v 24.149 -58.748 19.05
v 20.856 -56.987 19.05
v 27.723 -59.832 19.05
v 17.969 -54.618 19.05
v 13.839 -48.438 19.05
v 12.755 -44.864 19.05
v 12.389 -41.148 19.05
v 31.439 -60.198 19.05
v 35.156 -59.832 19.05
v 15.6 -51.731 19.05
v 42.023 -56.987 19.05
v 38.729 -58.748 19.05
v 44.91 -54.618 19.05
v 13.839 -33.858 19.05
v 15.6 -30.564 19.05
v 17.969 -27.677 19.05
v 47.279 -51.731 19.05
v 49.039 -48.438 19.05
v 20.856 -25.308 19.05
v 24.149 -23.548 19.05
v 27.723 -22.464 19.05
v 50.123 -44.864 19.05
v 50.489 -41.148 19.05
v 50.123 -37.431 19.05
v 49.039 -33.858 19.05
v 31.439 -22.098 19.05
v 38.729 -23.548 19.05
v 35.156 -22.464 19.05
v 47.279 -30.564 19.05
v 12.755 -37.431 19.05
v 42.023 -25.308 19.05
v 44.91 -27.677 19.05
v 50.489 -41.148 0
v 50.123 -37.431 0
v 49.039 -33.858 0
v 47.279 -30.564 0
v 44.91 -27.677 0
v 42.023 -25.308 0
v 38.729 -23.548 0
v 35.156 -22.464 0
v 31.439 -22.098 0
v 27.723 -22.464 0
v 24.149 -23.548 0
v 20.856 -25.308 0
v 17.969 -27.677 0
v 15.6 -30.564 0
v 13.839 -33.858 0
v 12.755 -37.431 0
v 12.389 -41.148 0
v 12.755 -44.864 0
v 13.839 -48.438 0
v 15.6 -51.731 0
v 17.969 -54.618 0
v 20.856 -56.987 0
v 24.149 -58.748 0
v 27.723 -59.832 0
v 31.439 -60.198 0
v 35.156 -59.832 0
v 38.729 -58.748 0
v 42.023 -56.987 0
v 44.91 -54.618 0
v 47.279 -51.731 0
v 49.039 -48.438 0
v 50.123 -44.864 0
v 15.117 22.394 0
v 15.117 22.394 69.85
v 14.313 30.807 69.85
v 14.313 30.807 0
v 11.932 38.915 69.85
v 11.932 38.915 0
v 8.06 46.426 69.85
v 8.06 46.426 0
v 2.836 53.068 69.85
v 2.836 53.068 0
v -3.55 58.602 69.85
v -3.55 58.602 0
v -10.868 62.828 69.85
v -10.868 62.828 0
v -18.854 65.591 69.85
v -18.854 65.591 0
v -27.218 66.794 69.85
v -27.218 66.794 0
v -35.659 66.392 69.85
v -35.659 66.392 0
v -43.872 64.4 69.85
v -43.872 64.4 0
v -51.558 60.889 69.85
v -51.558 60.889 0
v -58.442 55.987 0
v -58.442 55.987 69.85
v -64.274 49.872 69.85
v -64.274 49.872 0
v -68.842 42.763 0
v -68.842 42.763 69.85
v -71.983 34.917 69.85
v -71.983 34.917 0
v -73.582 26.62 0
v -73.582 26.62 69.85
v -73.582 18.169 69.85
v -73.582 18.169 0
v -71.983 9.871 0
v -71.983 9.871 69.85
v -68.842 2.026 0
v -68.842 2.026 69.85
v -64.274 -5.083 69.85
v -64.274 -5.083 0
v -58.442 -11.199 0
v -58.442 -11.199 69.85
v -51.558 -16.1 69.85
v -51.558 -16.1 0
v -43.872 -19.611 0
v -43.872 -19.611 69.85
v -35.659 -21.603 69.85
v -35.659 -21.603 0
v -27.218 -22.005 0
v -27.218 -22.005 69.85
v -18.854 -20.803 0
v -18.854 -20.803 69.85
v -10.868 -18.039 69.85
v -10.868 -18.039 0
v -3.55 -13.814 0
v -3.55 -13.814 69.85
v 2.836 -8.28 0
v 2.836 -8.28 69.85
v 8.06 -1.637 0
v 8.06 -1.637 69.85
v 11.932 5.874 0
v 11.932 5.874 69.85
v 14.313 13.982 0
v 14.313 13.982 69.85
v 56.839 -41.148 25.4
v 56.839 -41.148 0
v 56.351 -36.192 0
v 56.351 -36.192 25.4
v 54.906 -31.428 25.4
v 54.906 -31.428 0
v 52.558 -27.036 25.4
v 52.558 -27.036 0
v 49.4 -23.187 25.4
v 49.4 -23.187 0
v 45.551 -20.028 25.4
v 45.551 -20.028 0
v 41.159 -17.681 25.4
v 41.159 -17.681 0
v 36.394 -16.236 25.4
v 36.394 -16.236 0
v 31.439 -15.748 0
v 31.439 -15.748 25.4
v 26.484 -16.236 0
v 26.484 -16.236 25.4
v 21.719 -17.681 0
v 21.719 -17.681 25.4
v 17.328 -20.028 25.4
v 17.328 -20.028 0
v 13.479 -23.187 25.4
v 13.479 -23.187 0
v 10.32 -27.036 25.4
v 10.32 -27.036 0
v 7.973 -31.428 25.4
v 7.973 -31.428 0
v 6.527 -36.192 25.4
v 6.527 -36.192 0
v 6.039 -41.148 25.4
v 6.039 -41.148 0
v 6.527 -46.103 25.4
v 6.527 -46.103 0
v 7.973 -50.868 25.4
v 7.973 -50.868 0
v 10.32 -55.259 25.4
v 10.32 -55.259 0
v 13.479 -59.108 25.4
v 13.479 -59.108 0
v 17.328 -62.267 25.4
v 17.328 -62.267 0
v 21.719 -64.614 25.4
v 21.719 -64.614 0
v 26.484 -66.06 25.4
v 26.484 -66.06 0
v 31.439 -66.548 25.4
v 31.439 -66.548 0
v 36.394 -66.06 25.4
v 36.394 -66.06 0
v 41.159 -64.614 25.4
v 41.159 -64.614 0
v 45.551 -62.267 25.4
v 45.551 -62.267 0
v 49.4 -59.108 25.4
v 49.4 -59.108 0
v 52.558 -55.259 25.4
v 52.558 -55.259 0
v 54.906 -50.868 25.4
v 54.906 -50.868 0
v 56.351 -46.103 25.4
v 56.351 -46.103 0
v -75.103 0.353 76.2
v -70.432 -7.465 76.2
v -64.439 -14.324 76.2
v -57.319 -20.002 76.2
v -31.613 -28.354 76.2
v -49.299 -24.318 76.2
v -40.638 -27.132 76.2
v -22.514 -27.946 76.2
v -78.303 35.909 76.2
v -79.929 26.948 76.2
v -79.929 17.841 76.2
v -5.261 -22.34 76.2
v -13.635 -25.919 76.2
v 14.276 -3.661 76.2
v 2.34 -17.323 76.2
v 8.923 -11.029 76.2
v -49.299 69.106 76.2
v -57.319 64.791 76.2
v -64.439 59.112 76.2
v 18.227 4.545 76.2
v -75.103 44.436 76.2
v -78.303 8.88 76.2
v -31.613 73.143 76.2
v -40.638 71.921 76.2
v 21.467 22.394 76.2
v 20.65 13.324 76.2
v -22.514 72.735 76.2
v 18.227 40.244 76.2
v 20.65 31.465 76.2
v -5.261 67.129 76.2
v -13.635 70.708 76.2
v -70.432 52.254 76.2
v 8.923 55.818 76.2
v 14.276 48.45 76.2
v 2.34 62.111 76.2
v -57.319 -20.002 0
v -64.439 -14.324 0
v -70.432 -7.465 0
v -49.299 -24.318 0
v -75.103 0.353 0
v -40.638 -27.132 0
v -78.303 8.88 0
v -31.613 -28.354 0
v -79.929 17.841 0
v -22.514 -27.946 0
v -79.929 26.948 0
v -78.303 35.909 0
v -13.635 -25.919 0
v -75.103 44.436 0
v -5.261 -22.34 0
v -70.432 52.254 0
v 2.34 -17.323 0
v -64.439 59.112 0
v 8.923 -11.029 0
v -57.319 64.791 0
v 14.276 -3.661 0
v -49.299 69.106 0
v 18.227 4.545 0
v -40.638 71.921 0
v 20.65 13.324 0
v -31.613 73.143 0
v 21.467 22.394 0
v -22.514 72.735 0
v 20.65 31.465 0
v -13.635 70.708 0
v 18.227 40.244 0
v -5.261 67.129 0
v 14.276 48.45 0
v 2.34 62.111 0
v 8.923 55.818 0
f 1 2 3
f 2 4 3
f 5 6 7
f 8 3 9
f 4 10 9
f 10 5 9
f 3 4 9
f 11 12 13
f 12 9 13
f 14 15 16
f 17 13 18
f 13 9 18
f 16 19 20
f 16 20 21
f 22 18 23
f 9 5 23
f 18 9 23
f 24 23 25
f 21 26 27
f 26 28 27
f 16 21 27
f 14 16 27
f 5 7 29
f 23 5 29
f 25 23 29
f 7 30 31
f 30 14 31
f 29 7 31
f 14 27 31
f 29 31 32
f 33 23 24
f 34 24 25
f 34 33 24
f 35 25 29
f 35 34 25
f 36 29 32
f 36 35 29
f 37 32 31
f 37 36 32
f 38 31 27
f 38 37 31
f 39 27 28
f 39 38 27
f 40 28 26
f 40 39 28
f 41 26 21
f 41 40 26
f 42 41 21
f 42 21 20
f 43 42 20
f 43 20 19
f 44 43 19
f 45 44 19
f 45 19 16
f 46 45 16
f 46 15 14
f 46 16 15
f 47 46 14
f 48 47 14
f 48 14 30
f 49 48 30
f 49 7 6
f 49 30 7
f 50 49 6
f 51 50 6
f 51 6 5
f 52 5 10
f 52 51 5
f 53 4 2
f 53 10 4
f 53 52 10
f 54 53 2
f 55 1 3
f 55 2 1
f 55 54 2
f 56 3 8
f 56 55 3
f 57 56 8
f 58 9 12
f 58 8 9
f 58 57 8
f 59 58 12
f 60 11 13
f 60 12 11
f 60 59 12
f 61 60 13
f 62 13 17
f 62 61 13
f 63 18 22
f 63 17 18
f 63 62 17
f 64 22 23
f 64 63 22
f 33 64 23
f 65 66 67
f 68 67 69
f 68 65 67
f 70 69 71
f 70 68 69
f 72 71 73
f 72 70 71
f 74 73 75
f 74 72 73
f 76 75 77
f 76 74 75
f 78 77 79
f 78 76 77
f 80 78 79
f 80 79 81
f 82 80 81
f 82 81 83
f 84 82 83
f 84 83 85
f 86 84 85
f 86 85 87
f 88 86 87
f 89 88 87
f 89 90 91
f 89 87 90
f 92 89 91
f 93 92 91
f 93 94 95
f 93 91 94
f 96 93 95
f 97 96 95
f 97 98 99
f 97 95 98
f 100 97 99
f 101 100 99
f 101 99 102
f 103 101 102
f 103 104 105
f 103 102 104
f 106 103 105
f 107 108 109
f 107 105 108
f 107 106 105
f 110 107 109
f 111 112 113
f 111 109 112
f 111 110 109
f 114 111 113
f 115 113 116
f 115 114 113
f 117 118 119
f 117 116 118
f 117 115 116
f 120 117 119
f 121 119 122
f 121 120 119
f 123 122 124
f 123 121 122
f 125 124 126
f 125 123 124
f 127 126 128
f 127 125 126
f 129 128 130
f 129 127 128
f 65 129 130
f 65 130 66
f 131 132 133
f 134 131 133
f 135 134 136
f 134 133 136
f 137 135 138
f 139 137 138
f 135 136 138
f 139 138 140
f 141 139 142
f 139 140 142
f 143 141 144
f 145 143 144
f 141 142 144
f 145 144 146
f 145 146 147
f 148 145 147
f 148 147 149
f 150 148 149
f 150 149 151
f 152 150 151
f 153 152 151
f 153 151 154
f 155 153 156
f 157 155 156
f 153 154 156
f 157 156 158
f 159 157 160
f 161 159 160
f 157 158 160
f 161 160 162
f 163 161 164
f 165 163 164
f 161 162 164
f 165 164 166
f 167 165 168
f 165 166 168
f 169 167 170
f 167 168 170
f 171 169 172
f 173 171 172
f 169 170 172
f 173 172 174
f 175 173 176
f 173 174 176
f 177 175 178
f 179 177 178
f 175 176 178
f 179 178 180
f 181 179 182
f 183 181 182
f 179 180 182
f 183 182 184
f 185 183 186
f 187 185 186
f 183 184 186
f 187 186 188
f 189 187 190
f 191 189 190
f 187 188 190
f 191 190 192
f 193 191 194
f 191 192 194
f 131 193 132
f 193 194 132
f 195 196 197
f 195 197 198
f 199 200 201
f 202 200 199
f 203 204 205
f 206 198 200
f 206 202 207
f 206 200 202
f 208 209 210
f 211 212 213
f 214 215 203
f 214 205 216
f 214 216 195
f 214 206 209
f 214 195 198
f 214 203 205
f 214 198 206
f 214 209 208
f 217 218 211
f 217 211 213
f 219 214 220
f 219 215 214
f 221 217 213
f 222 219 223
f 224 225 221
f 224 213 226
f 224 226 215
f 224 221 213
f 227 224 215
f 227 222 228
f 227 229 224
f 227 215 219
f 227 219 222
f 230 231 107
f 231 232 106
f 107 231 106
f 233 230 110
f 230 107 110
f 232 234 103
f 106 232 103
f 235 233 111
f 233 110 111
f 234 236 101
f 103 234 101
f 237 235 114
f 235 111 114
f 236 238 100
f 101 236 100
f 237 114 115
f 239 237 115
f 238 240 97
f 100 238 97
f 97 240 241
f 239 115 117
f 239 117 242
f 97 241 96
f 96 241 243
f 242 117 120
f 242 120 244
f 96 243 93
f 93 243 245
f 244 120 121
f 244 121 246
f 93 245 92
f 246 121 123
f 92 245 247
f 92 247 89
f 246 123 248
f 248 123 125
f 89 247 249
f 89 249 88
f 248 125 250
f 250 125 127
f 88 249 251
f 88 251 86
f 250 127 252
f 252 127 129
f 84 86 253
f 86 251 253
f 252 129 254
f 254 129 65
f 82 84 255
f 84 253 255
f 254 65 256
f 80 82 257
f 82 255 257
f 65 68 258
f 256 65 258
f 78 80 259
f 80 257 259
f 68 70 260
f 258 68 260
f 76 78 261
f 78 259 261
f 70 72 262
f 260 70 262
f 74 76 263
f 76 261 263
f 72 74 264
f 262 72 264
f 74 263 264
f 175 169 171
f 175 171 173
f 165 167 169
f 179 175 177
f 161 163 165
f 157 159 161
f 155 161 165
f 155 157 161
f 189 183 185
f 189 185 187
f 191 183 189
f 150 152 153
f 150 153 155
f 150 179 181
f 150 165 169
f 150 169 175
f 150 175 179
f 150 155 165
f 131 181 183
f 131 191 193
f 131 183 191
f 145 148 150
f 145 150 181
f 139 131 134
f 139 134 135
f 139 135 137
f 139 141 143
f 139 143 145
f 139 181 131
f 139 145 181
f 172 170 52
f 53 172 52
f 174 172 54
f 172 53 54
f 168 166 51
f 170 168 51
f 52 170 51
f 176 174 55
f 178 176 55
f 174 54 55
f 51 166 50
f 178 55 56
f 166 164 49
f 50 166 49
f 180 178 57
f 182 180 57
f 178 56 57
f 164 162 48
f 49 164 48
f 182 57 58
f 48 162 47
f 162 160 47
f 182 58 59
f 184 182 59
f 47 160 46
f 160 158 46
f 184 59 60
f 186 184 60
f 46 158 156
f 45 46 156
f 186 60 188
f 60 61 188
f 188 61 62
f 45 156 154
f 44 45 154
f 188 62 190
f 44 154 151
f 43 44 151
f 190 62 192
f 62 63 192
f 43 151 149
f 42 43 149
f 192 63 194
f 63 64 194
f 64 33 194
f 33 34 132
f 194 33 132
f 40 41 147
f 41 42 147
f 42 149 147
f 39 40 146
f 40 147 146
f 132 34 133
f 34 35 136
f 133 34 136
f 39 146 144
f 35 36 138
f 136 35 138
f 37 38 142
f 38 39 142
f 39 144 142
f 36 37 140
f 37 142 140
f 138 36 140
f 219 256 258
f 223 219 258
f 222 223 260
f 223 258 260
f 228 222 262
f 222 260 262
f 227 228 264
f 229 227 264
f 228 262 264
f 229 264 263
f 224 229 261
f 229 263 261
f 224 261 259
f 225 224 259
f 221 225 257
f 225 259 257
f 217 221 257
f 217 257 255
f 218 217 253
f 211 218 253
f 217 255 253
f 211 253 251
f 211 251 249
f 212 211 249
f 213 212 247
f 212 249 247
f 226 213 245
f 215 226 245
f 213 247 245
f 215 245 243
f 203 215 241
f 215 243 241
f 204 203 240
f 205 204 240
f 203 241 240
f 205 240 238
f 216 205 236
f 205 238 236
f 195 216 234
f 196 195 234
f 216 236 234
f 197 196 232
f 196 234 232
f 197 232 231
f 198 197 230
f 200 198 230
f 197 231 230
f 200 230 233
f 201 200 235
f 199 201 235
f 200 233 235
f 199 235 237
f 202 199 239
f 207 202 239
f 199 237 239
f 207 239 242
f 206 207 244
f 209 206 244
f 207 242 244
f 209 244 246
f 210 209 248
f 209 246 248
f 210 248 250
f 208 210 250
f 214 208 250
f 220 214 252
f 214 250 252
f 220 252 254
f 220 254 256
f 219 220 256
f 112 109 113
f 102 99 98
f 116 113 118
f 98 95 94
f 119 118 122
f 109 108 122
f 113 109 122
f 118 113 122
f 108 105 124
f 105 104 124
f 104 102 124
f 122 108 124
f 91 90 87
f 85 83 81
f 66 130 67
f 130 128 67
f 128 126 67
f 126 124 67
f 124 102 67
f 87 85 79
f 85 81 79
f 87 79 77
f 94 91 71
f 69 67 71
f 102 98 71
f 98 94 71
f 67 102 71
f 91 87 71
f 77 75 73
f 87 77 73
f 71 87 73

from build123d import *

# Parameters (mm, degrees)
F0_R     = 50.8
F2_DEPTH = 76.2
F1_R     = 25.4
F3_DEPTH = 25.4
F4_T     = -6.35
F5_T     = -6.35


with BuildPart() as f2:
    # F0 (on Top) → F2 (new body)
    with BuildSketch(Plane.XY):
        with Locations((-29.333496, 22.394389)):
            Circle(F0_R)
    extrude(amount=F2_DEPTH)

    # F4
    f4_openings = [f2.faces().sort_by_distance(p)[0] for p in [
        (-29.333496, 22.394389, 0),
    ]]
    offset(amount=F4_T, openings=f4_openings)


with BuildPart() as f3:
    # F1 (on Top) → F3 (new body)
    with BuildSketch(Plane.XY):
        with Locations((31.439163, -41.14778)):
            Circle(F1_R)
    extrude(amount=F3_DEPTH)

    # F5
    f5_openings = [f3.faces().sort_by_distance(p)[0] for p in [
        (31.439163, -41.14778, 0),
    ]]
    offset(amount=F5_T, openings=f5_openings)


solid = Compound([f2.part, f3.part])
